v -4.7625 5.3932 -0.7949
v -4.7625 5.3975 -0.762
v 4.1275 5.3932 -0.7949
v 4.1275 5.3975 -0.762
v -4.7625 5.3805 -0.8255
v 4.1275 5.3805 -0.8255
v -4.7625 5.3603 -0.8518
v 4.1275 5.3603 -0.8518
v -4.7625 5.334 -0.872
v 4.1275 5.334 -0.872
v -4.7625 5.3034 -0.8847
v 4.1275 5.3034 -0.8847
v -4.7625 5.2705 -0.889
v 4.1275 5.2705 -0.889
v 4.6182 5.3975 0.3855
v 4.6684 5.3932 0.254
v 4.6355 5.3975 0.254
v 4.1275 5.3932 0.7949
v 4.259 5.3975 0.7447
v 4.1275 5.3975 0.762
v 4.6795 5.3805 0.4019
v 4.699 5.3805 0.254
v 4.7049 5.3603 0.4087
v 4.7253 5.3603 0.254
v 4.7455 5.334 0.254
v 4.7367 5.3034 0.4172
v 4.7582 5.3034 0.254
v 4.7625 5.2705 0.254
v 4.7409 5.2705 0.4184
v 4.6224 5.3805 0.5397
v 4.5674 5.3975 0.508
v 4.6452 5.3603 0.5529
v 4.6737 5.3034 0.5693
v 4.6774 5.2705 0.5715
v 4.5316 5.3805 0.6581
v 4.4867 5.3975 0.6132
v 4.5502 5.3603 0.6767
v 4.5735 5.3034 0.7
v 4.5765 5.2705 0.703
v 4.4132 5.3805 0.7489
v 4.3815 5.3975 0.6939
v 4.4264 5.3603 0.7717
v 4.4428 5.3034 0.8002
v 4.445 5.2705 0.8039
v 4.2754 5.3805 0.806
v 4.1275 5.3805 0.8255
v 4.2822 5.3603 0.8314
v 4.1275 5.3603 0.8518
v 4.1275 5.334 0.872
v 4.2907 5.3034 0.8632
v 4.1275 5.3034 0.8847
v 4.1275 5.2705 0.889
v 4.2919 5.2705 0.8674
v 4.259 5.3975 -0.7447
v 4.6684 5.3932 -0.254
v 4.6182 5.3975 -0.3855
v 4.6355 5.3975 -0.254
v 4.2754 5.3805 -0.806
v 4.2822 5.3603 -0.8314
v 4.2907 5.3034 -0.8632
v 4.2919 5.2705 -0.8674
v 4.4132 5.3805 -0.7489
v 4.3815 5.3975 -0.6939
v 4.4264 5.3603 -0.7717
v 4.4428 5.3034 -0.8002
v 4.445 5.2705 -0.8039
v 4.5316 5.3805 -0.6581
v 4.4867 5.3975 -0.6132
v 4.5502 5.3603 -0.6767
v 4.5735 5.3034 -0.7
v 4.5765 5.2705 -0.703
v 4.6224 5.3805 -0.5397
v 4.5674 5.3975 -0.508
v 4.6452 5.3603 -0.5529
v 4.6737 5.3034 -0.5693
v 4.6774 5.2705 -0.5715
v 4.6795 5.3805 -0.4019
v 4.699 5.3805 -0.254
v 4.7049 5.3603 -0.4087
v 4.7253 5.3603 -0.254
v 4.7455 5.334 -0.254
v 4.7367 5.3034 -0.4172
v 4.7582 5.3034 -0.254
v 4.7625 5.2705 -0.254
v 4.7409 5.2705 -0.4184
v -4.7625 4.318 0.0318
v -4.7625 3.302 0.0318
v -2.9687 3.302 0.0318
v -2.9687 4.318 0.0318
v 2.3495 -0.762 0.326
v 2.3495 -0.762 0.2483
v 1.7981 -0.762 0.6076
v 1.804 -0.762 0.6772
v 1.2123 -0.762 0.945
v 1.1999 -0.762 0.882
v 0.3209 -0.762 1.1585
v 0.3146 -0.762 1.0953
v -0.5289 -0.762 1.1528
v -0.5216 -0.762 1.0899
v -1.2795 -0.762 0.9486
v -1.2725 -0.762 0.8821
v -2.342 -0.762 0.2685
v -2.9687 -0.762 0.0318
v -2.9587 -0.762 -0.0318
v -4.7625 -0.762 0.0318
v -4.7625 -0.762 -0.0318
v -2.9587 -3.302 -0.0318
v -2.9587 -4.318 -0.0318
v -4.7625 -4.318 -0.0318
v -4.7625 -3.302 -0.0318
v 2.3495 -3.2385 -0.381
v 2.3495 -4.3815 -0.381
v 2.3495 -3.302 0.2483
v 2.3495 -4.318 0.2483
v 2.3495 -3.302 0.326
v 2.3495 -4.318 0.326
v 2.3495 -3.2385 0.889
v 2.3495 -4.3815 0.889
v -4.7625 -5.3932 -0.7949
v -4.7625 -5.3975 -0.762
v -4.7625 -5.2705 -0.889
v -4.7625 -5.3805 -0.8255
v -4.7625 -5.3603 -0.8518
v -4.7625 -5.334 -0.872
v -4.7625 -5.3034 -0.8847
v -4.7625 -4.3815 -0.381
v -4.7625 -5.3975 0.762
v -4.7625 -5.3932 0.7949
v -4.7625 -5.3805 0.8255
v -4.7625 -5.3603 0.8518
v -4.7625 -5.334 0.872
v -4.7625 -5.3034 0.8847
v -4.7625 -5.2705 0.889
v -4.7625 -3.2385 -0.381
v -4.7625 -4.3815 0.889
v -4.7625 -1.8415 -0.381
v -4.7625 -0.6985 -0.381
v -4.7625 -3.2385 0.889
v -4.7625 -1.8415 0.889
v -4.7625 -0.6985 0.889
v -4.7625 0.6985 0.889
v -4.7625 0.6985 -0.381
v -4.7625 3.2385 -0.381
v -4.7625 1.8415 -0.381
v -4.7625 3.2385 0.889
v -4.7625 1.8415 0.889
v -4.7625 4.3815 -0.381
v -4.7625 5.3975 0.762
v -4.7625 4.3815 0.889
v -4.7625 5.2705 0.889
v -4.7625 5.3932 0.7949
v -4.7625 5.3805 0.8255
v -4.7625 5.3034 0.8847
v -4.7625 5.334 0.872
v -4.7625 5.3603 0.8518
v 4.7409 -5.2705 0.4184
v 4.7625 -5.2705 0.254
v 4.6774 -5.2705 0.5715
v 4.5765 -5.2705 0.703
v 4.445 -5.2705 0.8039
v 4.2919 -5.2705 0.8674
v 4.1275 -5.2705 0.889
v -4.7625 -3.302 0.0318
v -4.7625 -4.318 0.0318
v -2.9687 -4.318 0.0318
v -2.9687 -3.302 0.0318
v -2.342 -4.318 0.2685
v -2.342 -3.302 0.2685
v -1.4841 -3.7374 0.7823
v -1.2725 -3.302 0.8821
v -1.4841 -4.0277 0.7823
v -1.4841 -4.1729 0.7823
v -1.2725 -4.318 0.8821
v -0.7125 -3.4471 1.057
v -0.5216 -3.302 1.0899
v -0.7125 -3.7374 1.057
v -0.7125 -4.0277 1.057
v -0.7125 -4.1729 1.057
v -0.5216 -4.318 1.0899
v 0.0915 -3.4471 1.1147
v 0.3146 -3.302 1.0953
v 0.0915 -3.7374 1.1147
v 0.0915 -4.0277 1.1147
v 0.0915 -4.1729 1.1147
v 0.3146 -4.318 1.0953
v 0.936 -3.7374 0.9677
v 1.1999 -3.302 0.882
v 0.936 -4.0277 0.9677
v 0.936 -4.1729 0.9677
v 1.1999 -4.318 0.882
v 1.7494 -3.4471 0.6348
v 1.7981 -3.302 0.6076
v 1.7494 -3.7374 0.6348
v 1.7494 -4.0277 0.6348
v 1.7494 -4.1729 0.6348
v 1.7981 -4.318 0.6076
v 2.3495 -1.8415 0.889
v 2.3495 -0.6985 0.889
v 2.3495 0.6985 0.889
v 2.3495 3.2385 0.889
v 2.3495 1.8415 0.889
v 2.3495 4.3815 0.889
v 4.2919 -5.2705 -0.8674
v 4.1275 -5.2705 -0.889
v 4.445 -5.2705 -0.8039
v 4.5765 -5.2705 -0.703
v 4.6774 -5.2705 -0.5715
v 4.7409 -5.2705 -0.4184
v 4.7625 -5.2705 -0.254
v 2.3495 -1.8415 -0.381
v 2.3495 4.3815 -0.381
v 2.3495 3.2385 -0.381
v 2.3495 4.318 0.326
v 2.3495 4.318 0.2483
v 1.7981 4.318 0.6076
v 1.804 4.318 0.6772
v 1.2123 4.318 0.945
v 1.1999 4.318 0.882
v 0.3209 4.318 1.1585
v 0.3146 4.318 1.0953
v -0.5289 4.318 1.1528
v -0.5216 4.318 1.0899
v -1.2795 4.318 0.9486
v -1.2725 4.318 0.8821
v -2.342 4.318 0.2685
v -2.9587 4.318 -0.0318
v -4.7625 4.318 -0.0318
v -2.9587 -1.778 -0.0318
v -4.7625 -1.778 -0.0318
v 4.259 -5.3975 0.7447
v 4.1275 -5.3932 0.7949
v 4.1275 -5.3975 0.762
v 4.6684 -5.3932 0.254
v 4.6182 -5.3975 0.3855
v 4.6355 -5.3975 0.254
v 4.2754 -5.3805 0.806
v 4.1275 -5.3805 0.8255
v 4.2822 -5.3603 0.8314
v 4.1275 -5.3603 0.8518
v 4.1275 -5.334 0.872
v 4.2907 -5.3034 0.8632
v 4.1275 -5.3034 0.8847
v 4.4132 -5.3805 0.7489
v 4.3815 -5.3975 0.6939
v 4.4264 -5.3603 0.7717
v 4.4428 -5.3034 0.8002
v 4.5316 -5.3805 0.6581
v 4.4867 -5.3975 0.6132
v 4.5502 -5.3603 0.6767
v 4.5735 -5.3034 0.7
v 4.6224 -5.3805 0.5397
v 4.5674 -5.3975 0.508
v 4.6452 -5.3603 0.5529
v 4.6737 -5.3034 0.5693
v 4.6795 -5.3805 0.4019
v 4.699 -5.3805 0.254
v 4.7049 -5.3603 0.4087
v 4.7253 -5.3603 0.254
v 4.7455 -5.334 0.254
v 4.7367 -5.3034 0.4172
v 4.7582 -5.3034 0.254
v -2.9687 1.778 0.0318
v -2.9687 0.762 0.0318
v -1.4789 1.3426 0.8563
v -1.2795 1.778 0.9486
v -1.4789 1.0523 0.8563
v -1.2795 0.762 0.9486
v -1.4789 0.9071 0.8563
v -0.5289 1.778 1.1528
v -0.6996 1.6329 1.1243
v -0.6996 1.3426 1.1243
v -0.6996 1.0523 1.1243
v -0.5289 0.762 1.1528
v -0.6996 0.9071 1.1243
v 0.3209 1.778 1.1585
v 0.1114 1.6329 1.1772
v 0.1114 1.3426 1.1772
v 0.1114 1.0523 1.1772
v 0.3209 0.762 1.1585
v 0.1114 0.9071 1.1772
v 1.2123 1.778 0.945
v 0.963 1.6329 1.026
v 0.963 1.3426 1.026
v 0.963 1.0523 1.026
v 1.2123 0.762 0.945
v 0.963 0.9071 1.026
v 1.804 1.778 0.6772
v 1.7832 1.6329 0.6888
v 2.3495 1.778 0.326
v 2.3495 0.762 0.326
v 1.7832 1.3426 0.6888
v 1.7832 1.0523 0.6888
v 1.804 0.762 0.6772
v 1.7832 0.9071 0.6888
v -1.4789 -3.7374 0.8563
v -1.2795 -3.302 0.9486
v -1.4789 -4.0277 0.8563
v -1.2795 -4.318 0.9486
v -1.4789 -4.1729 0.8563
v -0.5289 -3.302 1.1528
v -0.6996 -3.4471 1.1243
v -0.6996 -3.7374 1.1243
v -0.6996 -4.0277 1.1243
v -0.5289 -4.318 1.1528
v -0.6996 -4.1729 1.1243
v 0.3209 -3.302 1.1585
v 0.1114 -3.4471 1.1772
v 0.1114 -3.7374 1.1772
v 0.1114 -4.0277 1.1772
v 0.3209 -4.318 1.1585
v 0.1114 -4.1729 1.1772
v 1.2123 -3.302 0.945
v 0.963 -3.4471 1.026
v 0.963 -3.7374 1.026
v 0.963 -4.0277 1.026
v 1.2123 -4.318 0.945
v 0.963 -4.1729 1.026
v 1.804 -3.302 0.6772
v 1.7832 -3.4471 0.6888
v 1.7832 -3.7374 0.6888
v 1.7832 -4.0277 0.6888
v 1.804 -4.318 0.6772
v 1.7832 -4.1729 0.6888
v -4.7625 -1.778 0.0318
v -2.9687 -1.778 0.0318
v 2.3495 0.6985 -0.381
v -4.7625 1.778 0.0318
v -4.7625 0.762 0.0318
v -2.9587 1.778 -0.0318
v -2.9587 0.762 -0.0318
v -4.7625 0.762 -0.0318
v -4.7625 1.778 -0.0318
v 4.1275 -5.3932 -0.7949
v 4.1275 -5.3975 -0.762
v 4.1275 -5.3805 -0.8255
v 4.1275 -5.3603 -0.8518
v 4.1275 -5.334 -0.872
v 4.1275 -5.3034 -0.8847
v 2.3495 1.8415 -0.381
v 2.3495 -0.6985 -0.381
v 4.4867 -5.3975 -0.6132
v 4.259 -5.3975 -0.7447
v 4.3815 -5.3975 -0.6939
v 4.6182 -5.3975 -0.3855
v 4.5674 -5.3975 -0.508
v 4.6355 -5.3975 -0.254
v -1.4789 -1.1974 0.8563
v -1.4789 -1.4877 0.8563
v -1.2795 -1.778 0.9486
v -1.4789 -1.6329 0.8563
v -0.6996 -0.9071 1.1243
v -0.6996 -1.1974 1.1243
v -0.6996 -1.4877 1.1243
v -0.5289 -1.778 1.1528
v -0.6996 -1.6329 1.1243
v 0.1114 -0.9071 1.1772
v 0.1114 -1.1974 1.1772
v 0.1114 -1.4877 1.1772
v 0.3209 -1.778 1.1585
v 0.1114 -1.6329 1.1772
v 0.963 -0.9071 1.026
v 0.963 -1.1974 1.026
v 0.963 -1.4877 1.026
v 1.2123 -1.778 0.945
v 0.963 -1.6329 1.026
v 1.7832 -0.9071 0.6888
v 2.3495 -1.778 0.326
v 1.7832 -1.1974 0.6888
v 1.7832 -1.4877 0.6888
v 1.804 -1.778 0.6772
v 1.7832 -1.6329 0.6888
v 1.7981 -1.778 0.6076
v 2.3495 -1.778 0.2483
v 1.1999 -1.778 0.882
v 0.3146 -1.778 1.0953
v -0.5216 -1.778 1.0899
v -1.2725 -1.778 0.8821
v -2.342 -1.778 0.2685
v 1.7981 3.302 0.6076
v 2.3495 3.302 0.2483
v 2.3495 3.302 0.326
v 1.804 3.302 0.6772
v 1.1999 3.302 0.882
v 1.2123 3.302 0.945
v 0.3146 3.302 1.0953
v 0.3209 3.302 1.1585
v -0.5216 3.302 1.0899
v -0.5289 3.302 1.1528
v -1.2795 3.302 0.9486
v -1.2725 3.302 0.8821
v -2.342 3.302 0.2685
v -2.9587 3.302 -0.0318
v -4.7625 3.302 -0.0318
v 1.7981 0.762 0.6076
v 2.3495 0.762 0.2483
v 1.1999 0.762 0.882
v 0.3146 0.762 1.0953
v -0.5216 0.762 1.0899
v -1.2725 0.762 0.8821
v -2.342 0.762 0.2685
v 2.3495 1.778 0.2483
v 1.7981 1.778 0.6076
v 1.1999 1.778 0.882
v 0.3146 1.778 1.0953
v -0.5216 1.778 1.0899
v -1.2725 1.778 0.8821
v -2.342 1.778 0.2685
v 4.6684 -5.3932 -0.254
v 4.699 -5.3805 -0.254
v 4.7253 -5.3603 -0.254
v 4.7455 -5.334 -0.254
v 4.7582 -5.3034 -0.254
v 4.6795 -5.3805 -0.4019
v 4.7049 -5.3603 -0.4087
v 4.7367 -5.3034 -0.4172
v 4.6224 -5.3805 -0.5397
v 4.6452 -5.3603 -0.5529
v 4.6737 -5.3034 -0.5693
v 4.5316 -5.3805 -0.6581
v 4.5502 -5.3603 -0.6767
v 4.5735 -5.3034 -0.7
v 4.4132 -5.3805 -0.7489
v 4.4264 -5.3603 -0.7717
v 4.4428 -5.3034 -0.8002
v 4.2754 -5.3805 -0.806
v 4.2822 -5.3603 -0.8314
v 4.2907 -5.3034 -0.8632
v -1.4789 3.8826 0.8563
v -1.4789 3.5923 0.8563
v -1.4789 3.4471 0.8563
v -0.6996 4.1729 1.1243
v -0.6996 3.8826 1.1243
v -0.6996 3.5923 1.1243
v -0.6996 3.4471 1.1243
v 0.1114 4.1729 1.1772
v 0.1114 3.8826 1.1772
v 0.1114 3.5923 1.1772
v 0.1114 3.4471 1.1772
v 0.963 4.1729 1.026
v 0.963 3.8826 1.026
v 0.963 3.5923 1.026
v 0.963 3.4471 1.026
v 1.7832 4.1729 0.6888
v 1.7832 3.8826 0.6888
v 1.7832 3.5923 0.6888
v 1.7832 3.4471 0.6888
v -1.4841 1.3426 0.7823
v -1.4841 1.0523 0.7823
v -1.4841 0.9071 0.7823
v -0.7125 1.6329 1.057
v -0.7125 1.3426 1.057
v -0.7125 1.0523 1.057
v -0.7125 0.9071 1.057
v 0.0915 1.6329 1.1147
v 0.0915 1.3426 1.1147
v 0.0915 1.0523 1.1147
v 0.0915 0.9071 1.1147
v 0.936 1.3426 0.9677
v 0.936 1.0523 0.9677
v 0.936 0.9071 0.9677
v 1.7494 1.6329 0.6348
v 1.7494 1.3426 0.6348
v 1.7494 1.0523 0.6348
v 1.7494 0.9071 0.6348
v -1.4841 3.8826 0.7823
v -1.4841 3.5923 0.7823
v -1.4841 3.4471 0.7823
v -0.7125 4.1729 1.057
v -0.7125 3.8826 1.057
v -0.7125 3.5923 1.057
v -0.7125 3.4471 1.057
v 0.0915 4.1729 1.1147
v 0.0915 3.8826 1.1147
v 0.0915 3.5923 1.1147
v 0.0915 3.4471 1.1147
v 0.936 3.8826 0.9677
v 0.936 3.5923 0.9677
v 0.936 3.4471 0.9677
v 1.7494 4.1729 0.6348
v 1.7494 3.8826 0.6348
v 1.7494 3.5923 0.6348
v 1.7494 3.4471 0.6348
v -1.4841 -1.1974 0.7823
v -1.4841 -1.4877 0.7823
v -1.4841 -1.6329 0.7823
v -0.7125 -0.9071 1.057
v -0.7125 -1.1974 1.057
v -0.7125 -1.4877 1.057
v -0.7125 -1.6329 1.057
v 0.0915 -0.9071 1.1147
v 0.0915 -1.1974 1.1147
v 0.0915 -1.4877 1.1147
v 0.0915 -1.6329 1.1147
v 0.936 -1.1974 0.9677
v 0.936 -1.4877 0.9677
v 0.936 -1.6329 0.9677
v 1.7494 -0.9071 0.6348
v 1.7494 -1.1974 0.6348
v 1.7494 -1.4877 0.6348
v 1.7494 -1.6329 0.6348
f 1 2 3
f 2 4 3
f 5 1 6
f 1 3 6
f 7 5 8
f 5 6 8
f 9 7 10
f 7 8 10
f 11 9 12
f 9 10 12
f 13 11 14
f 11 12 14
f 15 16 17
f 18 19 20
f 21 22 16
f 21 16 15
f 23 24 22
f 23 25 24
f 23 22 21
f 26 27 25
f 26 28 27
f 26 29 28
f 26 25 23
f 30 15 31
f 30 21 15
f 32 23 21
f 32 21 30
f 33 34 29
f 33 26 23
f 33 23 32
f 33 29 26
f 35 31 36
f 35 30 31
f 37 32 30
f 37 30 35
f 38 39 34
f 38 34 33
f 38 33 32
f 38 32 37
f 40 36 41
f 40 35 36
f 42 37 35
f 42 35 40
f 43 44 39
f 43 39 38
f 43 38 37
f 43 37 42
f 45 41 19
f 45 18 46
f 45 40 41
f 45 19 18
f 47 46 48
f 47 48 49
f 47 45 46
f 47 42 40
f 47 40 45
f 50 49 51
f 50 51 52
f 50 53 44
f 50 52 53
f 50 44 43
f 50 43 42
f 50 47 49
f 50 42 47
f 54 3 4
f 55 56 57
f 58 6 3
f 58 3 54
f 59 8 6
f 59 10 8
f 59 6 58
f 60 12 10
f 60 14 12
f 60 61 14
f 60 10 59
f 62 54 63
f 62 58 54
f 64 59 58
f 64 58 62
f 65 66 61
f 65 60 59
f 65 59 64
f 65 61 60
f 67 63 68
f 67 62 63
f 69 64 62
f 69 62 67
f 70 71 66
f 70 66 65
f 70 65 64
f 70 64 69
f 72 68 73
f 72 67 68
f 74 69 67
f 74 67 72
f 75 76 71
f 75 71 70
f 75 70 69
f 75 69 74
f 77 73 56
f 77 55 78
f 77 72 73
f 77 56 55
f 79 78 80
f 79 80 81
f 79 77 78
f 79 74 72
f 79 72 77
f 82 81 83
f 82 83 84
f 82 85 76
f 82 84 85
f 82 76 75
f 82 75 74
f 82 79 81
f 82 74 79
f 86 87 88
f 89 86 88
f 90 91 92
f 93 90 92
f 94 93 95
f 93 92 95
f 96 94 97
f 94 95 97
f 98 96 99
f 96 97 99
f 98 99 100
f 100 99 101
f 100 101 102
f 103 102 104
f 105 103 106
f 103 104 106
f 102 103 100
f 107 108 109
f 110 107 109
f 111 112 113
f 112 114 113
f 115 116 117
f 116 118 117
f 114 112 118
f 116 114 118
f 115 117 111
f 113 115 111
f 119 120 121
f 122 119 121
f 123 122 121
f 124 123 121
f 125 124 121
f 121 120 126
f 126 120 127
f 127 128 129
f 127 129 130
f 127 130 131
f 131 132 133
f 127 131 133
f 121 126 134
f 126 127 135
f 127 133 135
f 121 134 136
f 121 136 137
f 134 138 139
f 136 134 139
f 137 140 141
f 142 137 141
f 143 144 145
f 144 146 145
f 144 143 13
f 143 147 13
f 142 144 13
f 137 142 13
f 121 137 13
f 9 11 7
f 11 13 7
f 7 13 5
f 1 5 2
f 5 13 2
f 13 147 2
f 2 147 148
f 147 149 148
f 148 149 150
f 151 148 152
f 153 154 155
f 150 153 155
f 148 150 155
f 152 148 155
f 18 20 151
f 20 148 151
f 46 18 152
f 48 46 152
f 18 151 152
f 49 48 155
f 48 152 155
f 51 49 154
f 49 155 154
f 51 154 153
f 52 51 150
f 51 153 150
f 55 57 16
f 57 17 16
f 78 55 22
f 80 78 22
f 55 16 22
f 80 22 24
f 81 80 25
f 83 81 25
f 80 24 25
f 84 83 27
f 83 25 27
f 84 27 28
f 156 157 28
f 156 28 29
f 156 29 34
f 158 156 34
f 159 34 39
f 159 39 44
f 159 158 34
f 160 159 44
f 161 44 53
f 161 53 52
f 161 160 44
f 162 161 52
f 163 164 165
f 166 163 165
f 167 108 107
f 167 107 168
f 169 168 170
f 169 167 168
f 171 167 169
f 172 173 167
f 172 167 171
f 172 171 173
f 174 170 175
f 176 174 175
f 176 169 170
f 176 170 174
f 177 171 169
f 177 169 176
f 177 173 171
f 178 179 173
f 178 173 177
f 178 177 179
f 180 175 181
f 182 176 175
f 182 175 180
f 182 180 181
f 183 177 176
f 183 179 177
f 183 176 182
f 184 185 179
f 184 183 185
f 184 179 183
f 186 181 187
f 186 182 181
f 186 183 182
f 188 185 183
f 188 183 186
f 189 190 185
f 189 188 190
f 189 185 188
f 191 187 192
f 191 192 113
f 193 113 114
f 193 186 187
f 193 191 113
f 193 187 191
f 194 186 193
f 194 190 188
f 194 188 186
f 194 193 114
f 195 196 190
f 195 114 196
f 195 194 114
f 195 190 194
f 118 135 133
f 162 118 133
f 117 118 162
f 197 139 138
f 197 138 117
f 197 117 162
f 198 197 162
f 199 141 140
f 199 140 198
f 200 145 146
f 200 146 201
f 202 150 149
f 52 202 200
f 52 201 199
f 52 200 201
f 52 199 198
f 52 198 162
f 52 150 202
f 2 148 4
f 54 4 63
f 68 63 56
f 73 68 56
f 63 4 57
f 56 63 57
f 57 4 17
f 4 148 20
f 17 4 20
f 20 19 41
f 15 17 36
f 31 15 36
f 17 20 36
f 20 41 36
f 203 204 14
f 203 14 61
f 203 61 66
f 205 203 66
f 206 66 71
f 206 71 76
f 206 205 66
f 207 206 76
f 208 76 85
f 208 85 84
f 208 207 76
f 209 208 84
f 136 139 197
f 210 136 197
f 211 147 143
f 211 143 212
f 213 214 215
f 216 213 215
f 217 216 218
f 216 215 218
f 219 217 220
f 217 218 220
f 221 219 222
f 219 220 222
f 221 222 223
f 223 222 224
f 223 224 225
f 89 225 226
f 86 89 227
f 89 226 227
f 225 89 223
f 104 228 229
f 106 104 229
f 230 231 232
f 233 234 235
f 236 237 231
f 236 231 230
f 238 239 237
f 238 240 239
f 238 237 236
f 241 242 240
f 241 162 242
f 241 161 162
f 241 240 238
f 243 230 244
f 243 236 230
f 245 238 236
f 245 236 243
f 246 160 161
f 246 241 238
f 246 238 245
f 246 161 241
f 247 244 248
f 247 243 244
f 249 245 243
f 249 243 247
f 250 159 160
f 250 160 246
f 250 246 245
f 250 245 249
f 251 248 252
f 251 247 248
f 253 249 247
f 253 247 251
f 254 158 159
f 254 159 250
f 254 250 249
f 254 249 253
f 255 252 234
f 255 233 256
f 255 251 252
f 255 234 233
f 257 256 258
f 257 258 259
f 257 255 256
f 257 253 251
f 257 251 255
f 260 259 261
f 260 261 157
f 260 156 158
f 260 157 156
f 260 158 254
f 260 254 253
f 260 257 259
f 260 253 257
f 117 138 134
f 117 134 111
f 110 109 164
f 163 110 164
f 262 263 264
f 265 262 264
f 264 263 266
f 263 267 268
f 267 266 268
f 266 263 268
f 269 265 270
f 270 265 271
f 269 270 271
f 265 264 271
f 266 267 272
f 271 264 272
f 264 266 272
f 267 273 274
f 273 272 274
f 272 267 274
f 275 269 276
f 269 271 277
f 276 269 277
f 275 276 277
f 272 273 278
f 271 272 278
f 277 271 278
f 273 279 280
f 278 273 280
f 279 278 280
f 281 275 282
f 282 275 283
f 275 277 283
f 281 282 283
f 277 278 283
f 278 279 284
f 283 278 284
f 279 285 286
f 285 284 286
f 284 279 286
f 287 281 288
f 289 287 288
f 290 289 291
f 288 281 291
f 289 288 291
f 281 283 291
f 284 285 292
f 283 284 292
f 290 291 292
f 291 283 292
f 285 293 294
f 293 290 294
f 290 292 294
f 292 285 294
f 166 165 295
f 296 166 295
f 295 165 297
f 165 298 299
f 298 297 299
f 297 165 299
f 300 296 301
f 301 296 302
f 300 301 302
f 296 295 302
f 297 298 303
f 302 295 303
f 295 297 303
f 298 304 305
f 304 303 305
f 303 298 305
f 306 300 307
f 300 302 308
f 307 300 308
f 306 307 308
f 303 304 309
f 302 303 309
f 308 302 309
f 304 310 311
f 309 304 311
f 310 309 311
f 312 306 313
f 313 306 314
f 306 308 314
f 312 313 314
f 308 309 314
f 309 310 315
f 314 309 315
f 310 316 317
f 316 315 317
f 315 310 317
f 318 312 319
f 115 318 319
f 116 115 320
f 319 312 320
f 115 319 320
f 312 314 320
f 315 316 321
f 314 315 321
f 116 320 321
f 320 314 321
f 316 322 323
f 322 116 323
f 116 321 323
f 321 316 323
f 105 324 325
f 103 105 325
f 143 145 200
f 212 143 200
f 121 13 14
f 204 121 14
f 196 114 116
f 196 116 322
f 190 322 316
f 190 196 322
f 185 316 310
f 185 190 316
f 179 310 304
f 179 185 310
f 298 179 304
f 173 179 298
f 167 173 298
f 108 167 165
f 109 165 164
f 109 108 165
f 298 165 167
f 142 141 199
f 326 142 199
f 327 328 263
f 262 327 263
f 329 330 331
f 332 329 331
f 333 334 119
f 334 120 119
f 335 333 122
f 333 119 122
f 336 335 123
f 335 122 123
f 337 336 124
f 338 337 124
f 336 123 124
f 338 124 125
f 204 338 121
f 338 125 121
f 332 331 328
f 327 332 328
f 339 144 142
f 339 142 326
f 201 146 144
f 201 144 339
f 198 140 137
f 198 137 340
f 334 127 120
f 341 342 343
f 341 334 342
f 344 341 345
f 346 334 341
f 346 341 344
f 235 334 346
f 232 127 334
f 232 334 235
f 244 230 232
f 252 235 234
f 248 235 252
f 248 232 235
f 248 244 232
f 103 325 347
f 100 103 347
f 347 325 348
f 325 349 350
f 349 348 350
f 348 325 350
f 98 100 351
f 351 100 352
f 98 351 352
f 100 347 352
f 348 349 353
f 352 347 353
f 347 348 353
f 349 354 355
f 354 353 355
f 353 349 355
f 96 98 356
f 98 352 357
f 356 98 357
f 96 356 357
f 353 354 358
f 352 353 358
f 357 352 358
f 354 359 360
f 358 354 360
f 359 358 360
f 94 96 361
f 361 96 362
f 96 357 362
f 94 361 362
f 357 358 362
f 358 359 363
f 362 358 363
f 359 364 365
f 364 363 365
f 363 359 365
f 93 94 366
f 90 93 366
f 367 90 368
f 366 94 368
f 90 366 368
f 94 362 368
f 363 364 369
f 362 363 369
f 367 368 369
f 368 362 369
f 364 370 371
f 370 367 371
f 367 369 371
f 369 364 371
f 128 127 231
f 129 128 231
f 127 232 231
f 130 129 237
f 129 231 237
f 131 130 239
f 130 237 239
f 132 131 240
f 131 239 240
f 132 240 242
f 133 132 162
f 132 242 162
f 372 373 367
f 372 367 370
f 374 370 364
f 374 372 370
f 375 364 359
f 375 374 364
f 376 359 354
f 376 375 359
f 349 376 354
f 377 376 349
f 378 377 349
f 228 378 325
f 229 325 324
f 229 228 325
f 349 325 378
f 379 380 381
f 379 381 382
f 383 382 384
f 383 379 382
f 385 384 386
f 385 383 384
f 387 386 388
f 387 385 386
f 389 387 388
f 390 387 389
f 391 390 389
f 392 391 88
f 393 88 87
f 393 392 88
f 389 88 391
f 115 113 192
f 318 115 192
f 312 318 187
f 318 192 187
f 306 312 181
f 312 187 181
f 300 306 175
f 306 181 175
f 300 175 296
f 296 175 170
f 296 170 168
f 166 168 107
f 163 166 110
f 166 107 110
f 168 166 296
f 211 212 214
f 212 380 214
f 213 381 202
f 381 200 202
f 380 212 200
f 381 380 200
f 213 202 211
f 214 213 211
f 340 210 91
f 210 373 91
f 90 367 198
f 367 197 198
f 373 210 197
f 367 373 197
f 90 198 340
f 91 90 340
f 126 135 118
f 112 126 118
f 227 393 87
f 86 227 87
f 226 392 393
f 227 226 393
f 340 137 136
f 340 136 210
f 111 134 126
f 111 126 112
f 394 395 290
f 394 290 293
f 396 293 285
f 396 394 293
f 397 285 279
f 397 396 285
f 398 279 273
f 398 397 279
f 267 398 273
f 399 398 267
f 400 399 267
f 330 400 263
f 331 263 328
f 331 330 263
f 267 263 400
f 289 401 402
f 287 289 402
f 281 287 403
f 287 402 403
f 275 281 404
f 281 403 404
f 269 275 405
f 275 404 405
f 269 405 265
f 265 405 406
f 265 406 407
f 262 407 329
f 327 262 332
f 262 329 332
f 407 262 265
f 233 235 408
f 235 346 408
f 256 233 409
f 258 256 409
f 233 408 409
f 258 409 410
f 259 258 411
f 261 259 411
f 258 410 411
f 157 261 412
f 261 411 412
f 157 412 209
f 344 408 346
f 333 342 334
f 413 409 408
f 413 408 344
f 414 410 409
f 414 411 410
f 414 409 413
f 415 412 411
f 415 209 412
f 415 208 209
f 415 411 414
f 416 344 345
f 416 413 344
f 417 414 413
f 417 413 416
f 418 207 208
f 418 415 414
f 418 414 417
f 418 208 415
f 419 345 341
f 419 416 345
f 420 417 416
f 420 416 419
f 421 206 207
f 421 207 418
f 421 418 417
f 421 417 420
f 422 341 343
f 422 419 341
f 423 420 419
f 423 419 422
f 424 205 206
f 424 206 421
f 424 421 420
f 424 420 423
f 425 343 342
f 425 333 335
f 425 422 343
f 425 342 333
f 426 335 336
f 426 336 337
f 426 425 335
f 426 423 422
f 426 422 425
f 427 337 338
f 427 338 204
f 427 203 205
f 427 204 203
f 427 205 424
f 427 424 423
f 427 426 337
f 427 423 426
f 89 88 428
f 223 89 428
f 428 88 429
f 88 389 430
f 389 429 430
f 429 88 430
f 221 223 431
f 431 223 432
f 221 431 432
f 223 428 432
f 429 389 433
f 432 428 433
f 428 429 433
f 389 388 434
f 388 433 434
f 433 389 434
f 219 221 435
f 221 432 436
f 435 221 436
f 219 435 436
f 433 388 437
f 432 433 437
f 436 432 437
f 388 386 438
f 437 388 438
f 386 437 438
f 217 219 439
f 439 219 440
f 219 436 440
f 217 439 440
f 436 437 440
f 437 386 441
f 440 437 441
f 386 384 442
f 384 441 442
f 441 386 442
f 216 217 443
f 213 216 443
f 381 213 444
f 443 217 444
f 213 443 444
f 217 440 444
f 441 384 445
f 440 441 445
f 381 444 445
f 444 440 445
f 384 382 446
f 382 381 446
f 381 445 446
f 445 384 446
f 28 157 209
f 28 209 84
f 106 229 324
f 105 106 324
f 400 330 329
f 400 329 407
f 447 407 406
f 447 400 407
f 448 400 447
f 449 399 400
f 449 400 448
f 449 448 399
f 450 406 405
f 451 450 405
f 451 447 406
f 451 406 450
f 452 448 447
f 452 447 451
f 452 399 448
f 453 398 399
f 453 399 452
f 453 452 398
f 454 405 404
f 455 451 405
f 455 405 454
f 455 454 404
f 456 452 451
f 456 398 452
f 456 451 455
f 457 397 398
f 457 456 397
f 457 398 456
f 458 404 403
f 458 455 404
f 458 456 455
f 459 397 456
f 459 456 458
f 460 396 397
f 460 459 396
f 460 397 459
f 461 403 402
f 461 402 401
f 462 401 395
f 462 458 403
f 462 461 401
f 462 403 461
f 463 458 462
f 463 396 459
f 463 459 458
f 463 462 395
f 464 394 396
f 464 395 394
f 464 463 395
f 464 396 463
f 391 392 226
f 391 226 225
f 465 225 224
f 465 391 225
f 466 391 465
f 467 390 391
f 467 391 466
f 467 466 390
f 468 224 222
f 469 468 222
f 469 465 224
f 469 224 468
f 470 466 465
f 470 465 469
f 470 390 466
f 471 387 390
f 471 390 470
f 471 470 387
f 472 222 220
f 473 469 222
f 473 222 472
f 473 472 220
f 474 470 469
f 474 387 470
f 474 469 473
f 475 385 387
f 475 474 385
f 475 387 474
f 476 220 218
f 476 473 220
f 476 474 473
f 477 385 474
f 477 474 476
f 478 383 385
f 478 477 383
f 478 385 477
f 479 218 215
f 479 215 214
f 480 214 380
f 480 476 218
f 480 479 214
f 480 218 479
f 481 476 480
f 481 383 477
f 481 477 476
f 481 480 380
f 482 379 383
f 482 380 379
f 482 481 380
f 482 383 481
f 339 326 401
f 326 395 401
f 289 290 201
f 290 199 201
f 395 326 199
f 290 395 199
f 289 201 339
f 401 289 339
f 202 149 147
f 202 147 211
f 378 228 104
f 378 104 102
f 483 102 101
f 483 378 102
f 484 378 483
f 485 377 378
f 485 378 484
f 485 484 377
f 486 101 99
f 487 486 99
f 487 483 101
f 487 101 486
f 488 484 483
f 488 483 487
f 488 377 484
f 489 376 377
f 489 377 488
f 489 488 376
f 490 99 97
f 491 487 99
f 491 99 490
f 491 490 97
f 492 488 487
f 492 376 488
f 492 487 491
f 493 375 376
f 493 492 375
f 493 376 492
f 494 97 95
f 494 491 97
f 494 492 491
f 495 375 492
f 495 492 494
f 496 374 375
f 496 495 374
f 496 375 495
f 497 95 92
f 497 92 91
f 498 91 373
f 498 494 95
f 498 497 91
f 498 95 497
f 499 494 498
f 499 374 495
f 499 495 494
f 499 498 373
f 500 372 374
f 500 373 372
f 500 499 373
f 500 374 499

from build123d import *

# Parameters (mm, degrees)
SKETCH1_W           = 9.525
SKETCH1_H           = 10.795
BOSS_EXTRUDE1_DEPTH = 0.889
SKETCH2_W           = 7.112
SKETCH2_H           = 1.143
CUT_EXTRUDE1_DEPTH  = 1.27
LPATTERN1_COUNT     = 4
LPATTERN1_PITCH     = 2.54
SWEEP1_START        = 3.302
SWEEP1_DEPTH        = 1.016
LPATTERN2_COUNT     = 4
LPATTERN2_PITCH     = 2.54
CUT_EXTRUDE2_DEPTH  = 12.8580274
FILLET2_R           = 0.127


# Read off the part's stored shape, not the designer's step: Sweep1
with BuildPart() as part:
    # Sketch1 → Boss-Extrude1 (new, symmetric)
    with BuildSketch(Plane.XY):
        Rectangle(SKETCH1_W, SKETCH1_H)
    extrude(amount=BOSS_EXTRUDE1_DEPTH, both=True)

    # Sketch2 → Cut-Extrude1 (cut)
    with BuildSketch(Plane.XY.offset(0.889)):
        with Locations((-1.2065, 3.81)):
            Rectangle(SKETCH2_W, SKETCH2_H)
    cut_extrude1 = extrude(amount=-CUT_EXTRUDE1_DEPTH, mode=Mode.SUBTRACT)

    # LPattern1: Cut-Extrude1 ×4
    with Locations(*[(0, -i * LPATTERN1_PITCH, 0) for i in range(1, LPATTERN1_COUNT)]):
        add(cut_extrude1, mode=Mode.SUBTRACT)

    # Sweep1 outline → Sweep1 (add)
    with BuildSketch(Plane(origin=(0, 0, 0), x_dir=(1, 0, 0), z_dir=(0, 1, 0)).offset(SWEEP1_START)):
        with BuildLine():
            add(Edge.make_bspline(
                [(-2.958664485, 0.03175), (-2.706405798, -0.084396657), (-2.195293689, -0.319726362), (-1.514674501, -0.811036045), (-0.723468732, -1.093477281), (0.111091297, -1.1480463), (0.950883413, -0.99405052), (1.715489301, -0.68557292), (2.154910348, -0.386399802), (2.3495, -0.248288405)],
                knots=[0, 0, 0, 0, 0.1400972, 0.283856925, 0.421522391, 0.557109715, 0.701349819, 0.849245032, 0.969367335, 0.969367335, 0.969367335, 0.969367335], degree=3))
            Line((-2.958664485, 0.03175), (-4.7625, 0.03175))
            Line((-4.7625, 0.03175), (-4.7625, -0.03175))
            Line((-4.7625, -0.03175), (-2.968725914, -0.03175))
            add(Edge.make_bspline(
                [(-2.968725914, -0.03175), (-2.714491455, -0.15140088), (-2.19937615, -0.393830641), (-1.50930601, -0.887085656), (-0.710525949, -1.159958237), (0.131263589, -1.2104677), (0.978085908, -1.052203574), (1.73427594, -0.74581201), (2.165863748, -0.455666821), (2.3495, -0.326036057)],
                knots=[0, 0, 0, 0, 0.1400972, 0.283856925, 0.421522391, 0.557109715, 0.701349819, 0.849245032, 0.961516171, 0.961516171, 0.961516171, 0.961516171], degree=3))
            Line((2.3495, -0.326036057), (2.3495, -0.248288405))
        make_face()
    sweep1 = extrude(amount=SWEEP1_DEPTH)

    # LPattern2: Sweep1 ×4
    with Locations(*[(0, -i * LPATTERN2_PITCH, 0) for i in range(1, LPATTERN2_COUNT)]):
        add(sweep1)

    # Sketch5 → Cut-Extrude2 (cut, through all)
    with BuildSketch(Plane.XZ.offset(5.3975)):
        with BuildLine():
            Line((4.1275, 0.889), (4.830136411, 0.889))
            Line((4.830136411, 0.889), (4.830136411, -0.889))
            Line((4.830136411, -0.889), (4.1275, -0.889))
            ThreePointArc((4.1275, -0.889), (4.576512806, -0.703012806), (4.7625, -0.254))
            Line((4.7625, -0.254), (4.7625, 0.254))
            ThreePointArc((4.7625, 0.254), (4.576512806, 0.703012806), (4.1275, 0.889))
        make_face()
    extrude(amount=-CUT_EXTRUDE2_DEPTH, mode=Mode.SUBTRACT)

    # Fillet2
    fillet2_edges = [part.edges().sort_by_distance(p)[0] for p in [
        (-0.3175, -5.3975, 0.889),
        (-0.3175, 5.3975, -0.889),
        (-0.3175, 5.3975, 0.889),
        (4.7625, -5.3975, 0),
        (4.7625, 5.3975, 0),
        (4.576512806, -5.3975, 0.703012806),
        (4.576512806, -5.3975, -0.703012806),
        (4.576512806, 5.3975, -0.703012806),
        (4.576512806, 5.3975, 0.703012806),
        (-0.3175, -5.3975, -0.889),
    ]]
    fillet(fillet2_edges, radius=FILLET2_R)


solid = part.part
